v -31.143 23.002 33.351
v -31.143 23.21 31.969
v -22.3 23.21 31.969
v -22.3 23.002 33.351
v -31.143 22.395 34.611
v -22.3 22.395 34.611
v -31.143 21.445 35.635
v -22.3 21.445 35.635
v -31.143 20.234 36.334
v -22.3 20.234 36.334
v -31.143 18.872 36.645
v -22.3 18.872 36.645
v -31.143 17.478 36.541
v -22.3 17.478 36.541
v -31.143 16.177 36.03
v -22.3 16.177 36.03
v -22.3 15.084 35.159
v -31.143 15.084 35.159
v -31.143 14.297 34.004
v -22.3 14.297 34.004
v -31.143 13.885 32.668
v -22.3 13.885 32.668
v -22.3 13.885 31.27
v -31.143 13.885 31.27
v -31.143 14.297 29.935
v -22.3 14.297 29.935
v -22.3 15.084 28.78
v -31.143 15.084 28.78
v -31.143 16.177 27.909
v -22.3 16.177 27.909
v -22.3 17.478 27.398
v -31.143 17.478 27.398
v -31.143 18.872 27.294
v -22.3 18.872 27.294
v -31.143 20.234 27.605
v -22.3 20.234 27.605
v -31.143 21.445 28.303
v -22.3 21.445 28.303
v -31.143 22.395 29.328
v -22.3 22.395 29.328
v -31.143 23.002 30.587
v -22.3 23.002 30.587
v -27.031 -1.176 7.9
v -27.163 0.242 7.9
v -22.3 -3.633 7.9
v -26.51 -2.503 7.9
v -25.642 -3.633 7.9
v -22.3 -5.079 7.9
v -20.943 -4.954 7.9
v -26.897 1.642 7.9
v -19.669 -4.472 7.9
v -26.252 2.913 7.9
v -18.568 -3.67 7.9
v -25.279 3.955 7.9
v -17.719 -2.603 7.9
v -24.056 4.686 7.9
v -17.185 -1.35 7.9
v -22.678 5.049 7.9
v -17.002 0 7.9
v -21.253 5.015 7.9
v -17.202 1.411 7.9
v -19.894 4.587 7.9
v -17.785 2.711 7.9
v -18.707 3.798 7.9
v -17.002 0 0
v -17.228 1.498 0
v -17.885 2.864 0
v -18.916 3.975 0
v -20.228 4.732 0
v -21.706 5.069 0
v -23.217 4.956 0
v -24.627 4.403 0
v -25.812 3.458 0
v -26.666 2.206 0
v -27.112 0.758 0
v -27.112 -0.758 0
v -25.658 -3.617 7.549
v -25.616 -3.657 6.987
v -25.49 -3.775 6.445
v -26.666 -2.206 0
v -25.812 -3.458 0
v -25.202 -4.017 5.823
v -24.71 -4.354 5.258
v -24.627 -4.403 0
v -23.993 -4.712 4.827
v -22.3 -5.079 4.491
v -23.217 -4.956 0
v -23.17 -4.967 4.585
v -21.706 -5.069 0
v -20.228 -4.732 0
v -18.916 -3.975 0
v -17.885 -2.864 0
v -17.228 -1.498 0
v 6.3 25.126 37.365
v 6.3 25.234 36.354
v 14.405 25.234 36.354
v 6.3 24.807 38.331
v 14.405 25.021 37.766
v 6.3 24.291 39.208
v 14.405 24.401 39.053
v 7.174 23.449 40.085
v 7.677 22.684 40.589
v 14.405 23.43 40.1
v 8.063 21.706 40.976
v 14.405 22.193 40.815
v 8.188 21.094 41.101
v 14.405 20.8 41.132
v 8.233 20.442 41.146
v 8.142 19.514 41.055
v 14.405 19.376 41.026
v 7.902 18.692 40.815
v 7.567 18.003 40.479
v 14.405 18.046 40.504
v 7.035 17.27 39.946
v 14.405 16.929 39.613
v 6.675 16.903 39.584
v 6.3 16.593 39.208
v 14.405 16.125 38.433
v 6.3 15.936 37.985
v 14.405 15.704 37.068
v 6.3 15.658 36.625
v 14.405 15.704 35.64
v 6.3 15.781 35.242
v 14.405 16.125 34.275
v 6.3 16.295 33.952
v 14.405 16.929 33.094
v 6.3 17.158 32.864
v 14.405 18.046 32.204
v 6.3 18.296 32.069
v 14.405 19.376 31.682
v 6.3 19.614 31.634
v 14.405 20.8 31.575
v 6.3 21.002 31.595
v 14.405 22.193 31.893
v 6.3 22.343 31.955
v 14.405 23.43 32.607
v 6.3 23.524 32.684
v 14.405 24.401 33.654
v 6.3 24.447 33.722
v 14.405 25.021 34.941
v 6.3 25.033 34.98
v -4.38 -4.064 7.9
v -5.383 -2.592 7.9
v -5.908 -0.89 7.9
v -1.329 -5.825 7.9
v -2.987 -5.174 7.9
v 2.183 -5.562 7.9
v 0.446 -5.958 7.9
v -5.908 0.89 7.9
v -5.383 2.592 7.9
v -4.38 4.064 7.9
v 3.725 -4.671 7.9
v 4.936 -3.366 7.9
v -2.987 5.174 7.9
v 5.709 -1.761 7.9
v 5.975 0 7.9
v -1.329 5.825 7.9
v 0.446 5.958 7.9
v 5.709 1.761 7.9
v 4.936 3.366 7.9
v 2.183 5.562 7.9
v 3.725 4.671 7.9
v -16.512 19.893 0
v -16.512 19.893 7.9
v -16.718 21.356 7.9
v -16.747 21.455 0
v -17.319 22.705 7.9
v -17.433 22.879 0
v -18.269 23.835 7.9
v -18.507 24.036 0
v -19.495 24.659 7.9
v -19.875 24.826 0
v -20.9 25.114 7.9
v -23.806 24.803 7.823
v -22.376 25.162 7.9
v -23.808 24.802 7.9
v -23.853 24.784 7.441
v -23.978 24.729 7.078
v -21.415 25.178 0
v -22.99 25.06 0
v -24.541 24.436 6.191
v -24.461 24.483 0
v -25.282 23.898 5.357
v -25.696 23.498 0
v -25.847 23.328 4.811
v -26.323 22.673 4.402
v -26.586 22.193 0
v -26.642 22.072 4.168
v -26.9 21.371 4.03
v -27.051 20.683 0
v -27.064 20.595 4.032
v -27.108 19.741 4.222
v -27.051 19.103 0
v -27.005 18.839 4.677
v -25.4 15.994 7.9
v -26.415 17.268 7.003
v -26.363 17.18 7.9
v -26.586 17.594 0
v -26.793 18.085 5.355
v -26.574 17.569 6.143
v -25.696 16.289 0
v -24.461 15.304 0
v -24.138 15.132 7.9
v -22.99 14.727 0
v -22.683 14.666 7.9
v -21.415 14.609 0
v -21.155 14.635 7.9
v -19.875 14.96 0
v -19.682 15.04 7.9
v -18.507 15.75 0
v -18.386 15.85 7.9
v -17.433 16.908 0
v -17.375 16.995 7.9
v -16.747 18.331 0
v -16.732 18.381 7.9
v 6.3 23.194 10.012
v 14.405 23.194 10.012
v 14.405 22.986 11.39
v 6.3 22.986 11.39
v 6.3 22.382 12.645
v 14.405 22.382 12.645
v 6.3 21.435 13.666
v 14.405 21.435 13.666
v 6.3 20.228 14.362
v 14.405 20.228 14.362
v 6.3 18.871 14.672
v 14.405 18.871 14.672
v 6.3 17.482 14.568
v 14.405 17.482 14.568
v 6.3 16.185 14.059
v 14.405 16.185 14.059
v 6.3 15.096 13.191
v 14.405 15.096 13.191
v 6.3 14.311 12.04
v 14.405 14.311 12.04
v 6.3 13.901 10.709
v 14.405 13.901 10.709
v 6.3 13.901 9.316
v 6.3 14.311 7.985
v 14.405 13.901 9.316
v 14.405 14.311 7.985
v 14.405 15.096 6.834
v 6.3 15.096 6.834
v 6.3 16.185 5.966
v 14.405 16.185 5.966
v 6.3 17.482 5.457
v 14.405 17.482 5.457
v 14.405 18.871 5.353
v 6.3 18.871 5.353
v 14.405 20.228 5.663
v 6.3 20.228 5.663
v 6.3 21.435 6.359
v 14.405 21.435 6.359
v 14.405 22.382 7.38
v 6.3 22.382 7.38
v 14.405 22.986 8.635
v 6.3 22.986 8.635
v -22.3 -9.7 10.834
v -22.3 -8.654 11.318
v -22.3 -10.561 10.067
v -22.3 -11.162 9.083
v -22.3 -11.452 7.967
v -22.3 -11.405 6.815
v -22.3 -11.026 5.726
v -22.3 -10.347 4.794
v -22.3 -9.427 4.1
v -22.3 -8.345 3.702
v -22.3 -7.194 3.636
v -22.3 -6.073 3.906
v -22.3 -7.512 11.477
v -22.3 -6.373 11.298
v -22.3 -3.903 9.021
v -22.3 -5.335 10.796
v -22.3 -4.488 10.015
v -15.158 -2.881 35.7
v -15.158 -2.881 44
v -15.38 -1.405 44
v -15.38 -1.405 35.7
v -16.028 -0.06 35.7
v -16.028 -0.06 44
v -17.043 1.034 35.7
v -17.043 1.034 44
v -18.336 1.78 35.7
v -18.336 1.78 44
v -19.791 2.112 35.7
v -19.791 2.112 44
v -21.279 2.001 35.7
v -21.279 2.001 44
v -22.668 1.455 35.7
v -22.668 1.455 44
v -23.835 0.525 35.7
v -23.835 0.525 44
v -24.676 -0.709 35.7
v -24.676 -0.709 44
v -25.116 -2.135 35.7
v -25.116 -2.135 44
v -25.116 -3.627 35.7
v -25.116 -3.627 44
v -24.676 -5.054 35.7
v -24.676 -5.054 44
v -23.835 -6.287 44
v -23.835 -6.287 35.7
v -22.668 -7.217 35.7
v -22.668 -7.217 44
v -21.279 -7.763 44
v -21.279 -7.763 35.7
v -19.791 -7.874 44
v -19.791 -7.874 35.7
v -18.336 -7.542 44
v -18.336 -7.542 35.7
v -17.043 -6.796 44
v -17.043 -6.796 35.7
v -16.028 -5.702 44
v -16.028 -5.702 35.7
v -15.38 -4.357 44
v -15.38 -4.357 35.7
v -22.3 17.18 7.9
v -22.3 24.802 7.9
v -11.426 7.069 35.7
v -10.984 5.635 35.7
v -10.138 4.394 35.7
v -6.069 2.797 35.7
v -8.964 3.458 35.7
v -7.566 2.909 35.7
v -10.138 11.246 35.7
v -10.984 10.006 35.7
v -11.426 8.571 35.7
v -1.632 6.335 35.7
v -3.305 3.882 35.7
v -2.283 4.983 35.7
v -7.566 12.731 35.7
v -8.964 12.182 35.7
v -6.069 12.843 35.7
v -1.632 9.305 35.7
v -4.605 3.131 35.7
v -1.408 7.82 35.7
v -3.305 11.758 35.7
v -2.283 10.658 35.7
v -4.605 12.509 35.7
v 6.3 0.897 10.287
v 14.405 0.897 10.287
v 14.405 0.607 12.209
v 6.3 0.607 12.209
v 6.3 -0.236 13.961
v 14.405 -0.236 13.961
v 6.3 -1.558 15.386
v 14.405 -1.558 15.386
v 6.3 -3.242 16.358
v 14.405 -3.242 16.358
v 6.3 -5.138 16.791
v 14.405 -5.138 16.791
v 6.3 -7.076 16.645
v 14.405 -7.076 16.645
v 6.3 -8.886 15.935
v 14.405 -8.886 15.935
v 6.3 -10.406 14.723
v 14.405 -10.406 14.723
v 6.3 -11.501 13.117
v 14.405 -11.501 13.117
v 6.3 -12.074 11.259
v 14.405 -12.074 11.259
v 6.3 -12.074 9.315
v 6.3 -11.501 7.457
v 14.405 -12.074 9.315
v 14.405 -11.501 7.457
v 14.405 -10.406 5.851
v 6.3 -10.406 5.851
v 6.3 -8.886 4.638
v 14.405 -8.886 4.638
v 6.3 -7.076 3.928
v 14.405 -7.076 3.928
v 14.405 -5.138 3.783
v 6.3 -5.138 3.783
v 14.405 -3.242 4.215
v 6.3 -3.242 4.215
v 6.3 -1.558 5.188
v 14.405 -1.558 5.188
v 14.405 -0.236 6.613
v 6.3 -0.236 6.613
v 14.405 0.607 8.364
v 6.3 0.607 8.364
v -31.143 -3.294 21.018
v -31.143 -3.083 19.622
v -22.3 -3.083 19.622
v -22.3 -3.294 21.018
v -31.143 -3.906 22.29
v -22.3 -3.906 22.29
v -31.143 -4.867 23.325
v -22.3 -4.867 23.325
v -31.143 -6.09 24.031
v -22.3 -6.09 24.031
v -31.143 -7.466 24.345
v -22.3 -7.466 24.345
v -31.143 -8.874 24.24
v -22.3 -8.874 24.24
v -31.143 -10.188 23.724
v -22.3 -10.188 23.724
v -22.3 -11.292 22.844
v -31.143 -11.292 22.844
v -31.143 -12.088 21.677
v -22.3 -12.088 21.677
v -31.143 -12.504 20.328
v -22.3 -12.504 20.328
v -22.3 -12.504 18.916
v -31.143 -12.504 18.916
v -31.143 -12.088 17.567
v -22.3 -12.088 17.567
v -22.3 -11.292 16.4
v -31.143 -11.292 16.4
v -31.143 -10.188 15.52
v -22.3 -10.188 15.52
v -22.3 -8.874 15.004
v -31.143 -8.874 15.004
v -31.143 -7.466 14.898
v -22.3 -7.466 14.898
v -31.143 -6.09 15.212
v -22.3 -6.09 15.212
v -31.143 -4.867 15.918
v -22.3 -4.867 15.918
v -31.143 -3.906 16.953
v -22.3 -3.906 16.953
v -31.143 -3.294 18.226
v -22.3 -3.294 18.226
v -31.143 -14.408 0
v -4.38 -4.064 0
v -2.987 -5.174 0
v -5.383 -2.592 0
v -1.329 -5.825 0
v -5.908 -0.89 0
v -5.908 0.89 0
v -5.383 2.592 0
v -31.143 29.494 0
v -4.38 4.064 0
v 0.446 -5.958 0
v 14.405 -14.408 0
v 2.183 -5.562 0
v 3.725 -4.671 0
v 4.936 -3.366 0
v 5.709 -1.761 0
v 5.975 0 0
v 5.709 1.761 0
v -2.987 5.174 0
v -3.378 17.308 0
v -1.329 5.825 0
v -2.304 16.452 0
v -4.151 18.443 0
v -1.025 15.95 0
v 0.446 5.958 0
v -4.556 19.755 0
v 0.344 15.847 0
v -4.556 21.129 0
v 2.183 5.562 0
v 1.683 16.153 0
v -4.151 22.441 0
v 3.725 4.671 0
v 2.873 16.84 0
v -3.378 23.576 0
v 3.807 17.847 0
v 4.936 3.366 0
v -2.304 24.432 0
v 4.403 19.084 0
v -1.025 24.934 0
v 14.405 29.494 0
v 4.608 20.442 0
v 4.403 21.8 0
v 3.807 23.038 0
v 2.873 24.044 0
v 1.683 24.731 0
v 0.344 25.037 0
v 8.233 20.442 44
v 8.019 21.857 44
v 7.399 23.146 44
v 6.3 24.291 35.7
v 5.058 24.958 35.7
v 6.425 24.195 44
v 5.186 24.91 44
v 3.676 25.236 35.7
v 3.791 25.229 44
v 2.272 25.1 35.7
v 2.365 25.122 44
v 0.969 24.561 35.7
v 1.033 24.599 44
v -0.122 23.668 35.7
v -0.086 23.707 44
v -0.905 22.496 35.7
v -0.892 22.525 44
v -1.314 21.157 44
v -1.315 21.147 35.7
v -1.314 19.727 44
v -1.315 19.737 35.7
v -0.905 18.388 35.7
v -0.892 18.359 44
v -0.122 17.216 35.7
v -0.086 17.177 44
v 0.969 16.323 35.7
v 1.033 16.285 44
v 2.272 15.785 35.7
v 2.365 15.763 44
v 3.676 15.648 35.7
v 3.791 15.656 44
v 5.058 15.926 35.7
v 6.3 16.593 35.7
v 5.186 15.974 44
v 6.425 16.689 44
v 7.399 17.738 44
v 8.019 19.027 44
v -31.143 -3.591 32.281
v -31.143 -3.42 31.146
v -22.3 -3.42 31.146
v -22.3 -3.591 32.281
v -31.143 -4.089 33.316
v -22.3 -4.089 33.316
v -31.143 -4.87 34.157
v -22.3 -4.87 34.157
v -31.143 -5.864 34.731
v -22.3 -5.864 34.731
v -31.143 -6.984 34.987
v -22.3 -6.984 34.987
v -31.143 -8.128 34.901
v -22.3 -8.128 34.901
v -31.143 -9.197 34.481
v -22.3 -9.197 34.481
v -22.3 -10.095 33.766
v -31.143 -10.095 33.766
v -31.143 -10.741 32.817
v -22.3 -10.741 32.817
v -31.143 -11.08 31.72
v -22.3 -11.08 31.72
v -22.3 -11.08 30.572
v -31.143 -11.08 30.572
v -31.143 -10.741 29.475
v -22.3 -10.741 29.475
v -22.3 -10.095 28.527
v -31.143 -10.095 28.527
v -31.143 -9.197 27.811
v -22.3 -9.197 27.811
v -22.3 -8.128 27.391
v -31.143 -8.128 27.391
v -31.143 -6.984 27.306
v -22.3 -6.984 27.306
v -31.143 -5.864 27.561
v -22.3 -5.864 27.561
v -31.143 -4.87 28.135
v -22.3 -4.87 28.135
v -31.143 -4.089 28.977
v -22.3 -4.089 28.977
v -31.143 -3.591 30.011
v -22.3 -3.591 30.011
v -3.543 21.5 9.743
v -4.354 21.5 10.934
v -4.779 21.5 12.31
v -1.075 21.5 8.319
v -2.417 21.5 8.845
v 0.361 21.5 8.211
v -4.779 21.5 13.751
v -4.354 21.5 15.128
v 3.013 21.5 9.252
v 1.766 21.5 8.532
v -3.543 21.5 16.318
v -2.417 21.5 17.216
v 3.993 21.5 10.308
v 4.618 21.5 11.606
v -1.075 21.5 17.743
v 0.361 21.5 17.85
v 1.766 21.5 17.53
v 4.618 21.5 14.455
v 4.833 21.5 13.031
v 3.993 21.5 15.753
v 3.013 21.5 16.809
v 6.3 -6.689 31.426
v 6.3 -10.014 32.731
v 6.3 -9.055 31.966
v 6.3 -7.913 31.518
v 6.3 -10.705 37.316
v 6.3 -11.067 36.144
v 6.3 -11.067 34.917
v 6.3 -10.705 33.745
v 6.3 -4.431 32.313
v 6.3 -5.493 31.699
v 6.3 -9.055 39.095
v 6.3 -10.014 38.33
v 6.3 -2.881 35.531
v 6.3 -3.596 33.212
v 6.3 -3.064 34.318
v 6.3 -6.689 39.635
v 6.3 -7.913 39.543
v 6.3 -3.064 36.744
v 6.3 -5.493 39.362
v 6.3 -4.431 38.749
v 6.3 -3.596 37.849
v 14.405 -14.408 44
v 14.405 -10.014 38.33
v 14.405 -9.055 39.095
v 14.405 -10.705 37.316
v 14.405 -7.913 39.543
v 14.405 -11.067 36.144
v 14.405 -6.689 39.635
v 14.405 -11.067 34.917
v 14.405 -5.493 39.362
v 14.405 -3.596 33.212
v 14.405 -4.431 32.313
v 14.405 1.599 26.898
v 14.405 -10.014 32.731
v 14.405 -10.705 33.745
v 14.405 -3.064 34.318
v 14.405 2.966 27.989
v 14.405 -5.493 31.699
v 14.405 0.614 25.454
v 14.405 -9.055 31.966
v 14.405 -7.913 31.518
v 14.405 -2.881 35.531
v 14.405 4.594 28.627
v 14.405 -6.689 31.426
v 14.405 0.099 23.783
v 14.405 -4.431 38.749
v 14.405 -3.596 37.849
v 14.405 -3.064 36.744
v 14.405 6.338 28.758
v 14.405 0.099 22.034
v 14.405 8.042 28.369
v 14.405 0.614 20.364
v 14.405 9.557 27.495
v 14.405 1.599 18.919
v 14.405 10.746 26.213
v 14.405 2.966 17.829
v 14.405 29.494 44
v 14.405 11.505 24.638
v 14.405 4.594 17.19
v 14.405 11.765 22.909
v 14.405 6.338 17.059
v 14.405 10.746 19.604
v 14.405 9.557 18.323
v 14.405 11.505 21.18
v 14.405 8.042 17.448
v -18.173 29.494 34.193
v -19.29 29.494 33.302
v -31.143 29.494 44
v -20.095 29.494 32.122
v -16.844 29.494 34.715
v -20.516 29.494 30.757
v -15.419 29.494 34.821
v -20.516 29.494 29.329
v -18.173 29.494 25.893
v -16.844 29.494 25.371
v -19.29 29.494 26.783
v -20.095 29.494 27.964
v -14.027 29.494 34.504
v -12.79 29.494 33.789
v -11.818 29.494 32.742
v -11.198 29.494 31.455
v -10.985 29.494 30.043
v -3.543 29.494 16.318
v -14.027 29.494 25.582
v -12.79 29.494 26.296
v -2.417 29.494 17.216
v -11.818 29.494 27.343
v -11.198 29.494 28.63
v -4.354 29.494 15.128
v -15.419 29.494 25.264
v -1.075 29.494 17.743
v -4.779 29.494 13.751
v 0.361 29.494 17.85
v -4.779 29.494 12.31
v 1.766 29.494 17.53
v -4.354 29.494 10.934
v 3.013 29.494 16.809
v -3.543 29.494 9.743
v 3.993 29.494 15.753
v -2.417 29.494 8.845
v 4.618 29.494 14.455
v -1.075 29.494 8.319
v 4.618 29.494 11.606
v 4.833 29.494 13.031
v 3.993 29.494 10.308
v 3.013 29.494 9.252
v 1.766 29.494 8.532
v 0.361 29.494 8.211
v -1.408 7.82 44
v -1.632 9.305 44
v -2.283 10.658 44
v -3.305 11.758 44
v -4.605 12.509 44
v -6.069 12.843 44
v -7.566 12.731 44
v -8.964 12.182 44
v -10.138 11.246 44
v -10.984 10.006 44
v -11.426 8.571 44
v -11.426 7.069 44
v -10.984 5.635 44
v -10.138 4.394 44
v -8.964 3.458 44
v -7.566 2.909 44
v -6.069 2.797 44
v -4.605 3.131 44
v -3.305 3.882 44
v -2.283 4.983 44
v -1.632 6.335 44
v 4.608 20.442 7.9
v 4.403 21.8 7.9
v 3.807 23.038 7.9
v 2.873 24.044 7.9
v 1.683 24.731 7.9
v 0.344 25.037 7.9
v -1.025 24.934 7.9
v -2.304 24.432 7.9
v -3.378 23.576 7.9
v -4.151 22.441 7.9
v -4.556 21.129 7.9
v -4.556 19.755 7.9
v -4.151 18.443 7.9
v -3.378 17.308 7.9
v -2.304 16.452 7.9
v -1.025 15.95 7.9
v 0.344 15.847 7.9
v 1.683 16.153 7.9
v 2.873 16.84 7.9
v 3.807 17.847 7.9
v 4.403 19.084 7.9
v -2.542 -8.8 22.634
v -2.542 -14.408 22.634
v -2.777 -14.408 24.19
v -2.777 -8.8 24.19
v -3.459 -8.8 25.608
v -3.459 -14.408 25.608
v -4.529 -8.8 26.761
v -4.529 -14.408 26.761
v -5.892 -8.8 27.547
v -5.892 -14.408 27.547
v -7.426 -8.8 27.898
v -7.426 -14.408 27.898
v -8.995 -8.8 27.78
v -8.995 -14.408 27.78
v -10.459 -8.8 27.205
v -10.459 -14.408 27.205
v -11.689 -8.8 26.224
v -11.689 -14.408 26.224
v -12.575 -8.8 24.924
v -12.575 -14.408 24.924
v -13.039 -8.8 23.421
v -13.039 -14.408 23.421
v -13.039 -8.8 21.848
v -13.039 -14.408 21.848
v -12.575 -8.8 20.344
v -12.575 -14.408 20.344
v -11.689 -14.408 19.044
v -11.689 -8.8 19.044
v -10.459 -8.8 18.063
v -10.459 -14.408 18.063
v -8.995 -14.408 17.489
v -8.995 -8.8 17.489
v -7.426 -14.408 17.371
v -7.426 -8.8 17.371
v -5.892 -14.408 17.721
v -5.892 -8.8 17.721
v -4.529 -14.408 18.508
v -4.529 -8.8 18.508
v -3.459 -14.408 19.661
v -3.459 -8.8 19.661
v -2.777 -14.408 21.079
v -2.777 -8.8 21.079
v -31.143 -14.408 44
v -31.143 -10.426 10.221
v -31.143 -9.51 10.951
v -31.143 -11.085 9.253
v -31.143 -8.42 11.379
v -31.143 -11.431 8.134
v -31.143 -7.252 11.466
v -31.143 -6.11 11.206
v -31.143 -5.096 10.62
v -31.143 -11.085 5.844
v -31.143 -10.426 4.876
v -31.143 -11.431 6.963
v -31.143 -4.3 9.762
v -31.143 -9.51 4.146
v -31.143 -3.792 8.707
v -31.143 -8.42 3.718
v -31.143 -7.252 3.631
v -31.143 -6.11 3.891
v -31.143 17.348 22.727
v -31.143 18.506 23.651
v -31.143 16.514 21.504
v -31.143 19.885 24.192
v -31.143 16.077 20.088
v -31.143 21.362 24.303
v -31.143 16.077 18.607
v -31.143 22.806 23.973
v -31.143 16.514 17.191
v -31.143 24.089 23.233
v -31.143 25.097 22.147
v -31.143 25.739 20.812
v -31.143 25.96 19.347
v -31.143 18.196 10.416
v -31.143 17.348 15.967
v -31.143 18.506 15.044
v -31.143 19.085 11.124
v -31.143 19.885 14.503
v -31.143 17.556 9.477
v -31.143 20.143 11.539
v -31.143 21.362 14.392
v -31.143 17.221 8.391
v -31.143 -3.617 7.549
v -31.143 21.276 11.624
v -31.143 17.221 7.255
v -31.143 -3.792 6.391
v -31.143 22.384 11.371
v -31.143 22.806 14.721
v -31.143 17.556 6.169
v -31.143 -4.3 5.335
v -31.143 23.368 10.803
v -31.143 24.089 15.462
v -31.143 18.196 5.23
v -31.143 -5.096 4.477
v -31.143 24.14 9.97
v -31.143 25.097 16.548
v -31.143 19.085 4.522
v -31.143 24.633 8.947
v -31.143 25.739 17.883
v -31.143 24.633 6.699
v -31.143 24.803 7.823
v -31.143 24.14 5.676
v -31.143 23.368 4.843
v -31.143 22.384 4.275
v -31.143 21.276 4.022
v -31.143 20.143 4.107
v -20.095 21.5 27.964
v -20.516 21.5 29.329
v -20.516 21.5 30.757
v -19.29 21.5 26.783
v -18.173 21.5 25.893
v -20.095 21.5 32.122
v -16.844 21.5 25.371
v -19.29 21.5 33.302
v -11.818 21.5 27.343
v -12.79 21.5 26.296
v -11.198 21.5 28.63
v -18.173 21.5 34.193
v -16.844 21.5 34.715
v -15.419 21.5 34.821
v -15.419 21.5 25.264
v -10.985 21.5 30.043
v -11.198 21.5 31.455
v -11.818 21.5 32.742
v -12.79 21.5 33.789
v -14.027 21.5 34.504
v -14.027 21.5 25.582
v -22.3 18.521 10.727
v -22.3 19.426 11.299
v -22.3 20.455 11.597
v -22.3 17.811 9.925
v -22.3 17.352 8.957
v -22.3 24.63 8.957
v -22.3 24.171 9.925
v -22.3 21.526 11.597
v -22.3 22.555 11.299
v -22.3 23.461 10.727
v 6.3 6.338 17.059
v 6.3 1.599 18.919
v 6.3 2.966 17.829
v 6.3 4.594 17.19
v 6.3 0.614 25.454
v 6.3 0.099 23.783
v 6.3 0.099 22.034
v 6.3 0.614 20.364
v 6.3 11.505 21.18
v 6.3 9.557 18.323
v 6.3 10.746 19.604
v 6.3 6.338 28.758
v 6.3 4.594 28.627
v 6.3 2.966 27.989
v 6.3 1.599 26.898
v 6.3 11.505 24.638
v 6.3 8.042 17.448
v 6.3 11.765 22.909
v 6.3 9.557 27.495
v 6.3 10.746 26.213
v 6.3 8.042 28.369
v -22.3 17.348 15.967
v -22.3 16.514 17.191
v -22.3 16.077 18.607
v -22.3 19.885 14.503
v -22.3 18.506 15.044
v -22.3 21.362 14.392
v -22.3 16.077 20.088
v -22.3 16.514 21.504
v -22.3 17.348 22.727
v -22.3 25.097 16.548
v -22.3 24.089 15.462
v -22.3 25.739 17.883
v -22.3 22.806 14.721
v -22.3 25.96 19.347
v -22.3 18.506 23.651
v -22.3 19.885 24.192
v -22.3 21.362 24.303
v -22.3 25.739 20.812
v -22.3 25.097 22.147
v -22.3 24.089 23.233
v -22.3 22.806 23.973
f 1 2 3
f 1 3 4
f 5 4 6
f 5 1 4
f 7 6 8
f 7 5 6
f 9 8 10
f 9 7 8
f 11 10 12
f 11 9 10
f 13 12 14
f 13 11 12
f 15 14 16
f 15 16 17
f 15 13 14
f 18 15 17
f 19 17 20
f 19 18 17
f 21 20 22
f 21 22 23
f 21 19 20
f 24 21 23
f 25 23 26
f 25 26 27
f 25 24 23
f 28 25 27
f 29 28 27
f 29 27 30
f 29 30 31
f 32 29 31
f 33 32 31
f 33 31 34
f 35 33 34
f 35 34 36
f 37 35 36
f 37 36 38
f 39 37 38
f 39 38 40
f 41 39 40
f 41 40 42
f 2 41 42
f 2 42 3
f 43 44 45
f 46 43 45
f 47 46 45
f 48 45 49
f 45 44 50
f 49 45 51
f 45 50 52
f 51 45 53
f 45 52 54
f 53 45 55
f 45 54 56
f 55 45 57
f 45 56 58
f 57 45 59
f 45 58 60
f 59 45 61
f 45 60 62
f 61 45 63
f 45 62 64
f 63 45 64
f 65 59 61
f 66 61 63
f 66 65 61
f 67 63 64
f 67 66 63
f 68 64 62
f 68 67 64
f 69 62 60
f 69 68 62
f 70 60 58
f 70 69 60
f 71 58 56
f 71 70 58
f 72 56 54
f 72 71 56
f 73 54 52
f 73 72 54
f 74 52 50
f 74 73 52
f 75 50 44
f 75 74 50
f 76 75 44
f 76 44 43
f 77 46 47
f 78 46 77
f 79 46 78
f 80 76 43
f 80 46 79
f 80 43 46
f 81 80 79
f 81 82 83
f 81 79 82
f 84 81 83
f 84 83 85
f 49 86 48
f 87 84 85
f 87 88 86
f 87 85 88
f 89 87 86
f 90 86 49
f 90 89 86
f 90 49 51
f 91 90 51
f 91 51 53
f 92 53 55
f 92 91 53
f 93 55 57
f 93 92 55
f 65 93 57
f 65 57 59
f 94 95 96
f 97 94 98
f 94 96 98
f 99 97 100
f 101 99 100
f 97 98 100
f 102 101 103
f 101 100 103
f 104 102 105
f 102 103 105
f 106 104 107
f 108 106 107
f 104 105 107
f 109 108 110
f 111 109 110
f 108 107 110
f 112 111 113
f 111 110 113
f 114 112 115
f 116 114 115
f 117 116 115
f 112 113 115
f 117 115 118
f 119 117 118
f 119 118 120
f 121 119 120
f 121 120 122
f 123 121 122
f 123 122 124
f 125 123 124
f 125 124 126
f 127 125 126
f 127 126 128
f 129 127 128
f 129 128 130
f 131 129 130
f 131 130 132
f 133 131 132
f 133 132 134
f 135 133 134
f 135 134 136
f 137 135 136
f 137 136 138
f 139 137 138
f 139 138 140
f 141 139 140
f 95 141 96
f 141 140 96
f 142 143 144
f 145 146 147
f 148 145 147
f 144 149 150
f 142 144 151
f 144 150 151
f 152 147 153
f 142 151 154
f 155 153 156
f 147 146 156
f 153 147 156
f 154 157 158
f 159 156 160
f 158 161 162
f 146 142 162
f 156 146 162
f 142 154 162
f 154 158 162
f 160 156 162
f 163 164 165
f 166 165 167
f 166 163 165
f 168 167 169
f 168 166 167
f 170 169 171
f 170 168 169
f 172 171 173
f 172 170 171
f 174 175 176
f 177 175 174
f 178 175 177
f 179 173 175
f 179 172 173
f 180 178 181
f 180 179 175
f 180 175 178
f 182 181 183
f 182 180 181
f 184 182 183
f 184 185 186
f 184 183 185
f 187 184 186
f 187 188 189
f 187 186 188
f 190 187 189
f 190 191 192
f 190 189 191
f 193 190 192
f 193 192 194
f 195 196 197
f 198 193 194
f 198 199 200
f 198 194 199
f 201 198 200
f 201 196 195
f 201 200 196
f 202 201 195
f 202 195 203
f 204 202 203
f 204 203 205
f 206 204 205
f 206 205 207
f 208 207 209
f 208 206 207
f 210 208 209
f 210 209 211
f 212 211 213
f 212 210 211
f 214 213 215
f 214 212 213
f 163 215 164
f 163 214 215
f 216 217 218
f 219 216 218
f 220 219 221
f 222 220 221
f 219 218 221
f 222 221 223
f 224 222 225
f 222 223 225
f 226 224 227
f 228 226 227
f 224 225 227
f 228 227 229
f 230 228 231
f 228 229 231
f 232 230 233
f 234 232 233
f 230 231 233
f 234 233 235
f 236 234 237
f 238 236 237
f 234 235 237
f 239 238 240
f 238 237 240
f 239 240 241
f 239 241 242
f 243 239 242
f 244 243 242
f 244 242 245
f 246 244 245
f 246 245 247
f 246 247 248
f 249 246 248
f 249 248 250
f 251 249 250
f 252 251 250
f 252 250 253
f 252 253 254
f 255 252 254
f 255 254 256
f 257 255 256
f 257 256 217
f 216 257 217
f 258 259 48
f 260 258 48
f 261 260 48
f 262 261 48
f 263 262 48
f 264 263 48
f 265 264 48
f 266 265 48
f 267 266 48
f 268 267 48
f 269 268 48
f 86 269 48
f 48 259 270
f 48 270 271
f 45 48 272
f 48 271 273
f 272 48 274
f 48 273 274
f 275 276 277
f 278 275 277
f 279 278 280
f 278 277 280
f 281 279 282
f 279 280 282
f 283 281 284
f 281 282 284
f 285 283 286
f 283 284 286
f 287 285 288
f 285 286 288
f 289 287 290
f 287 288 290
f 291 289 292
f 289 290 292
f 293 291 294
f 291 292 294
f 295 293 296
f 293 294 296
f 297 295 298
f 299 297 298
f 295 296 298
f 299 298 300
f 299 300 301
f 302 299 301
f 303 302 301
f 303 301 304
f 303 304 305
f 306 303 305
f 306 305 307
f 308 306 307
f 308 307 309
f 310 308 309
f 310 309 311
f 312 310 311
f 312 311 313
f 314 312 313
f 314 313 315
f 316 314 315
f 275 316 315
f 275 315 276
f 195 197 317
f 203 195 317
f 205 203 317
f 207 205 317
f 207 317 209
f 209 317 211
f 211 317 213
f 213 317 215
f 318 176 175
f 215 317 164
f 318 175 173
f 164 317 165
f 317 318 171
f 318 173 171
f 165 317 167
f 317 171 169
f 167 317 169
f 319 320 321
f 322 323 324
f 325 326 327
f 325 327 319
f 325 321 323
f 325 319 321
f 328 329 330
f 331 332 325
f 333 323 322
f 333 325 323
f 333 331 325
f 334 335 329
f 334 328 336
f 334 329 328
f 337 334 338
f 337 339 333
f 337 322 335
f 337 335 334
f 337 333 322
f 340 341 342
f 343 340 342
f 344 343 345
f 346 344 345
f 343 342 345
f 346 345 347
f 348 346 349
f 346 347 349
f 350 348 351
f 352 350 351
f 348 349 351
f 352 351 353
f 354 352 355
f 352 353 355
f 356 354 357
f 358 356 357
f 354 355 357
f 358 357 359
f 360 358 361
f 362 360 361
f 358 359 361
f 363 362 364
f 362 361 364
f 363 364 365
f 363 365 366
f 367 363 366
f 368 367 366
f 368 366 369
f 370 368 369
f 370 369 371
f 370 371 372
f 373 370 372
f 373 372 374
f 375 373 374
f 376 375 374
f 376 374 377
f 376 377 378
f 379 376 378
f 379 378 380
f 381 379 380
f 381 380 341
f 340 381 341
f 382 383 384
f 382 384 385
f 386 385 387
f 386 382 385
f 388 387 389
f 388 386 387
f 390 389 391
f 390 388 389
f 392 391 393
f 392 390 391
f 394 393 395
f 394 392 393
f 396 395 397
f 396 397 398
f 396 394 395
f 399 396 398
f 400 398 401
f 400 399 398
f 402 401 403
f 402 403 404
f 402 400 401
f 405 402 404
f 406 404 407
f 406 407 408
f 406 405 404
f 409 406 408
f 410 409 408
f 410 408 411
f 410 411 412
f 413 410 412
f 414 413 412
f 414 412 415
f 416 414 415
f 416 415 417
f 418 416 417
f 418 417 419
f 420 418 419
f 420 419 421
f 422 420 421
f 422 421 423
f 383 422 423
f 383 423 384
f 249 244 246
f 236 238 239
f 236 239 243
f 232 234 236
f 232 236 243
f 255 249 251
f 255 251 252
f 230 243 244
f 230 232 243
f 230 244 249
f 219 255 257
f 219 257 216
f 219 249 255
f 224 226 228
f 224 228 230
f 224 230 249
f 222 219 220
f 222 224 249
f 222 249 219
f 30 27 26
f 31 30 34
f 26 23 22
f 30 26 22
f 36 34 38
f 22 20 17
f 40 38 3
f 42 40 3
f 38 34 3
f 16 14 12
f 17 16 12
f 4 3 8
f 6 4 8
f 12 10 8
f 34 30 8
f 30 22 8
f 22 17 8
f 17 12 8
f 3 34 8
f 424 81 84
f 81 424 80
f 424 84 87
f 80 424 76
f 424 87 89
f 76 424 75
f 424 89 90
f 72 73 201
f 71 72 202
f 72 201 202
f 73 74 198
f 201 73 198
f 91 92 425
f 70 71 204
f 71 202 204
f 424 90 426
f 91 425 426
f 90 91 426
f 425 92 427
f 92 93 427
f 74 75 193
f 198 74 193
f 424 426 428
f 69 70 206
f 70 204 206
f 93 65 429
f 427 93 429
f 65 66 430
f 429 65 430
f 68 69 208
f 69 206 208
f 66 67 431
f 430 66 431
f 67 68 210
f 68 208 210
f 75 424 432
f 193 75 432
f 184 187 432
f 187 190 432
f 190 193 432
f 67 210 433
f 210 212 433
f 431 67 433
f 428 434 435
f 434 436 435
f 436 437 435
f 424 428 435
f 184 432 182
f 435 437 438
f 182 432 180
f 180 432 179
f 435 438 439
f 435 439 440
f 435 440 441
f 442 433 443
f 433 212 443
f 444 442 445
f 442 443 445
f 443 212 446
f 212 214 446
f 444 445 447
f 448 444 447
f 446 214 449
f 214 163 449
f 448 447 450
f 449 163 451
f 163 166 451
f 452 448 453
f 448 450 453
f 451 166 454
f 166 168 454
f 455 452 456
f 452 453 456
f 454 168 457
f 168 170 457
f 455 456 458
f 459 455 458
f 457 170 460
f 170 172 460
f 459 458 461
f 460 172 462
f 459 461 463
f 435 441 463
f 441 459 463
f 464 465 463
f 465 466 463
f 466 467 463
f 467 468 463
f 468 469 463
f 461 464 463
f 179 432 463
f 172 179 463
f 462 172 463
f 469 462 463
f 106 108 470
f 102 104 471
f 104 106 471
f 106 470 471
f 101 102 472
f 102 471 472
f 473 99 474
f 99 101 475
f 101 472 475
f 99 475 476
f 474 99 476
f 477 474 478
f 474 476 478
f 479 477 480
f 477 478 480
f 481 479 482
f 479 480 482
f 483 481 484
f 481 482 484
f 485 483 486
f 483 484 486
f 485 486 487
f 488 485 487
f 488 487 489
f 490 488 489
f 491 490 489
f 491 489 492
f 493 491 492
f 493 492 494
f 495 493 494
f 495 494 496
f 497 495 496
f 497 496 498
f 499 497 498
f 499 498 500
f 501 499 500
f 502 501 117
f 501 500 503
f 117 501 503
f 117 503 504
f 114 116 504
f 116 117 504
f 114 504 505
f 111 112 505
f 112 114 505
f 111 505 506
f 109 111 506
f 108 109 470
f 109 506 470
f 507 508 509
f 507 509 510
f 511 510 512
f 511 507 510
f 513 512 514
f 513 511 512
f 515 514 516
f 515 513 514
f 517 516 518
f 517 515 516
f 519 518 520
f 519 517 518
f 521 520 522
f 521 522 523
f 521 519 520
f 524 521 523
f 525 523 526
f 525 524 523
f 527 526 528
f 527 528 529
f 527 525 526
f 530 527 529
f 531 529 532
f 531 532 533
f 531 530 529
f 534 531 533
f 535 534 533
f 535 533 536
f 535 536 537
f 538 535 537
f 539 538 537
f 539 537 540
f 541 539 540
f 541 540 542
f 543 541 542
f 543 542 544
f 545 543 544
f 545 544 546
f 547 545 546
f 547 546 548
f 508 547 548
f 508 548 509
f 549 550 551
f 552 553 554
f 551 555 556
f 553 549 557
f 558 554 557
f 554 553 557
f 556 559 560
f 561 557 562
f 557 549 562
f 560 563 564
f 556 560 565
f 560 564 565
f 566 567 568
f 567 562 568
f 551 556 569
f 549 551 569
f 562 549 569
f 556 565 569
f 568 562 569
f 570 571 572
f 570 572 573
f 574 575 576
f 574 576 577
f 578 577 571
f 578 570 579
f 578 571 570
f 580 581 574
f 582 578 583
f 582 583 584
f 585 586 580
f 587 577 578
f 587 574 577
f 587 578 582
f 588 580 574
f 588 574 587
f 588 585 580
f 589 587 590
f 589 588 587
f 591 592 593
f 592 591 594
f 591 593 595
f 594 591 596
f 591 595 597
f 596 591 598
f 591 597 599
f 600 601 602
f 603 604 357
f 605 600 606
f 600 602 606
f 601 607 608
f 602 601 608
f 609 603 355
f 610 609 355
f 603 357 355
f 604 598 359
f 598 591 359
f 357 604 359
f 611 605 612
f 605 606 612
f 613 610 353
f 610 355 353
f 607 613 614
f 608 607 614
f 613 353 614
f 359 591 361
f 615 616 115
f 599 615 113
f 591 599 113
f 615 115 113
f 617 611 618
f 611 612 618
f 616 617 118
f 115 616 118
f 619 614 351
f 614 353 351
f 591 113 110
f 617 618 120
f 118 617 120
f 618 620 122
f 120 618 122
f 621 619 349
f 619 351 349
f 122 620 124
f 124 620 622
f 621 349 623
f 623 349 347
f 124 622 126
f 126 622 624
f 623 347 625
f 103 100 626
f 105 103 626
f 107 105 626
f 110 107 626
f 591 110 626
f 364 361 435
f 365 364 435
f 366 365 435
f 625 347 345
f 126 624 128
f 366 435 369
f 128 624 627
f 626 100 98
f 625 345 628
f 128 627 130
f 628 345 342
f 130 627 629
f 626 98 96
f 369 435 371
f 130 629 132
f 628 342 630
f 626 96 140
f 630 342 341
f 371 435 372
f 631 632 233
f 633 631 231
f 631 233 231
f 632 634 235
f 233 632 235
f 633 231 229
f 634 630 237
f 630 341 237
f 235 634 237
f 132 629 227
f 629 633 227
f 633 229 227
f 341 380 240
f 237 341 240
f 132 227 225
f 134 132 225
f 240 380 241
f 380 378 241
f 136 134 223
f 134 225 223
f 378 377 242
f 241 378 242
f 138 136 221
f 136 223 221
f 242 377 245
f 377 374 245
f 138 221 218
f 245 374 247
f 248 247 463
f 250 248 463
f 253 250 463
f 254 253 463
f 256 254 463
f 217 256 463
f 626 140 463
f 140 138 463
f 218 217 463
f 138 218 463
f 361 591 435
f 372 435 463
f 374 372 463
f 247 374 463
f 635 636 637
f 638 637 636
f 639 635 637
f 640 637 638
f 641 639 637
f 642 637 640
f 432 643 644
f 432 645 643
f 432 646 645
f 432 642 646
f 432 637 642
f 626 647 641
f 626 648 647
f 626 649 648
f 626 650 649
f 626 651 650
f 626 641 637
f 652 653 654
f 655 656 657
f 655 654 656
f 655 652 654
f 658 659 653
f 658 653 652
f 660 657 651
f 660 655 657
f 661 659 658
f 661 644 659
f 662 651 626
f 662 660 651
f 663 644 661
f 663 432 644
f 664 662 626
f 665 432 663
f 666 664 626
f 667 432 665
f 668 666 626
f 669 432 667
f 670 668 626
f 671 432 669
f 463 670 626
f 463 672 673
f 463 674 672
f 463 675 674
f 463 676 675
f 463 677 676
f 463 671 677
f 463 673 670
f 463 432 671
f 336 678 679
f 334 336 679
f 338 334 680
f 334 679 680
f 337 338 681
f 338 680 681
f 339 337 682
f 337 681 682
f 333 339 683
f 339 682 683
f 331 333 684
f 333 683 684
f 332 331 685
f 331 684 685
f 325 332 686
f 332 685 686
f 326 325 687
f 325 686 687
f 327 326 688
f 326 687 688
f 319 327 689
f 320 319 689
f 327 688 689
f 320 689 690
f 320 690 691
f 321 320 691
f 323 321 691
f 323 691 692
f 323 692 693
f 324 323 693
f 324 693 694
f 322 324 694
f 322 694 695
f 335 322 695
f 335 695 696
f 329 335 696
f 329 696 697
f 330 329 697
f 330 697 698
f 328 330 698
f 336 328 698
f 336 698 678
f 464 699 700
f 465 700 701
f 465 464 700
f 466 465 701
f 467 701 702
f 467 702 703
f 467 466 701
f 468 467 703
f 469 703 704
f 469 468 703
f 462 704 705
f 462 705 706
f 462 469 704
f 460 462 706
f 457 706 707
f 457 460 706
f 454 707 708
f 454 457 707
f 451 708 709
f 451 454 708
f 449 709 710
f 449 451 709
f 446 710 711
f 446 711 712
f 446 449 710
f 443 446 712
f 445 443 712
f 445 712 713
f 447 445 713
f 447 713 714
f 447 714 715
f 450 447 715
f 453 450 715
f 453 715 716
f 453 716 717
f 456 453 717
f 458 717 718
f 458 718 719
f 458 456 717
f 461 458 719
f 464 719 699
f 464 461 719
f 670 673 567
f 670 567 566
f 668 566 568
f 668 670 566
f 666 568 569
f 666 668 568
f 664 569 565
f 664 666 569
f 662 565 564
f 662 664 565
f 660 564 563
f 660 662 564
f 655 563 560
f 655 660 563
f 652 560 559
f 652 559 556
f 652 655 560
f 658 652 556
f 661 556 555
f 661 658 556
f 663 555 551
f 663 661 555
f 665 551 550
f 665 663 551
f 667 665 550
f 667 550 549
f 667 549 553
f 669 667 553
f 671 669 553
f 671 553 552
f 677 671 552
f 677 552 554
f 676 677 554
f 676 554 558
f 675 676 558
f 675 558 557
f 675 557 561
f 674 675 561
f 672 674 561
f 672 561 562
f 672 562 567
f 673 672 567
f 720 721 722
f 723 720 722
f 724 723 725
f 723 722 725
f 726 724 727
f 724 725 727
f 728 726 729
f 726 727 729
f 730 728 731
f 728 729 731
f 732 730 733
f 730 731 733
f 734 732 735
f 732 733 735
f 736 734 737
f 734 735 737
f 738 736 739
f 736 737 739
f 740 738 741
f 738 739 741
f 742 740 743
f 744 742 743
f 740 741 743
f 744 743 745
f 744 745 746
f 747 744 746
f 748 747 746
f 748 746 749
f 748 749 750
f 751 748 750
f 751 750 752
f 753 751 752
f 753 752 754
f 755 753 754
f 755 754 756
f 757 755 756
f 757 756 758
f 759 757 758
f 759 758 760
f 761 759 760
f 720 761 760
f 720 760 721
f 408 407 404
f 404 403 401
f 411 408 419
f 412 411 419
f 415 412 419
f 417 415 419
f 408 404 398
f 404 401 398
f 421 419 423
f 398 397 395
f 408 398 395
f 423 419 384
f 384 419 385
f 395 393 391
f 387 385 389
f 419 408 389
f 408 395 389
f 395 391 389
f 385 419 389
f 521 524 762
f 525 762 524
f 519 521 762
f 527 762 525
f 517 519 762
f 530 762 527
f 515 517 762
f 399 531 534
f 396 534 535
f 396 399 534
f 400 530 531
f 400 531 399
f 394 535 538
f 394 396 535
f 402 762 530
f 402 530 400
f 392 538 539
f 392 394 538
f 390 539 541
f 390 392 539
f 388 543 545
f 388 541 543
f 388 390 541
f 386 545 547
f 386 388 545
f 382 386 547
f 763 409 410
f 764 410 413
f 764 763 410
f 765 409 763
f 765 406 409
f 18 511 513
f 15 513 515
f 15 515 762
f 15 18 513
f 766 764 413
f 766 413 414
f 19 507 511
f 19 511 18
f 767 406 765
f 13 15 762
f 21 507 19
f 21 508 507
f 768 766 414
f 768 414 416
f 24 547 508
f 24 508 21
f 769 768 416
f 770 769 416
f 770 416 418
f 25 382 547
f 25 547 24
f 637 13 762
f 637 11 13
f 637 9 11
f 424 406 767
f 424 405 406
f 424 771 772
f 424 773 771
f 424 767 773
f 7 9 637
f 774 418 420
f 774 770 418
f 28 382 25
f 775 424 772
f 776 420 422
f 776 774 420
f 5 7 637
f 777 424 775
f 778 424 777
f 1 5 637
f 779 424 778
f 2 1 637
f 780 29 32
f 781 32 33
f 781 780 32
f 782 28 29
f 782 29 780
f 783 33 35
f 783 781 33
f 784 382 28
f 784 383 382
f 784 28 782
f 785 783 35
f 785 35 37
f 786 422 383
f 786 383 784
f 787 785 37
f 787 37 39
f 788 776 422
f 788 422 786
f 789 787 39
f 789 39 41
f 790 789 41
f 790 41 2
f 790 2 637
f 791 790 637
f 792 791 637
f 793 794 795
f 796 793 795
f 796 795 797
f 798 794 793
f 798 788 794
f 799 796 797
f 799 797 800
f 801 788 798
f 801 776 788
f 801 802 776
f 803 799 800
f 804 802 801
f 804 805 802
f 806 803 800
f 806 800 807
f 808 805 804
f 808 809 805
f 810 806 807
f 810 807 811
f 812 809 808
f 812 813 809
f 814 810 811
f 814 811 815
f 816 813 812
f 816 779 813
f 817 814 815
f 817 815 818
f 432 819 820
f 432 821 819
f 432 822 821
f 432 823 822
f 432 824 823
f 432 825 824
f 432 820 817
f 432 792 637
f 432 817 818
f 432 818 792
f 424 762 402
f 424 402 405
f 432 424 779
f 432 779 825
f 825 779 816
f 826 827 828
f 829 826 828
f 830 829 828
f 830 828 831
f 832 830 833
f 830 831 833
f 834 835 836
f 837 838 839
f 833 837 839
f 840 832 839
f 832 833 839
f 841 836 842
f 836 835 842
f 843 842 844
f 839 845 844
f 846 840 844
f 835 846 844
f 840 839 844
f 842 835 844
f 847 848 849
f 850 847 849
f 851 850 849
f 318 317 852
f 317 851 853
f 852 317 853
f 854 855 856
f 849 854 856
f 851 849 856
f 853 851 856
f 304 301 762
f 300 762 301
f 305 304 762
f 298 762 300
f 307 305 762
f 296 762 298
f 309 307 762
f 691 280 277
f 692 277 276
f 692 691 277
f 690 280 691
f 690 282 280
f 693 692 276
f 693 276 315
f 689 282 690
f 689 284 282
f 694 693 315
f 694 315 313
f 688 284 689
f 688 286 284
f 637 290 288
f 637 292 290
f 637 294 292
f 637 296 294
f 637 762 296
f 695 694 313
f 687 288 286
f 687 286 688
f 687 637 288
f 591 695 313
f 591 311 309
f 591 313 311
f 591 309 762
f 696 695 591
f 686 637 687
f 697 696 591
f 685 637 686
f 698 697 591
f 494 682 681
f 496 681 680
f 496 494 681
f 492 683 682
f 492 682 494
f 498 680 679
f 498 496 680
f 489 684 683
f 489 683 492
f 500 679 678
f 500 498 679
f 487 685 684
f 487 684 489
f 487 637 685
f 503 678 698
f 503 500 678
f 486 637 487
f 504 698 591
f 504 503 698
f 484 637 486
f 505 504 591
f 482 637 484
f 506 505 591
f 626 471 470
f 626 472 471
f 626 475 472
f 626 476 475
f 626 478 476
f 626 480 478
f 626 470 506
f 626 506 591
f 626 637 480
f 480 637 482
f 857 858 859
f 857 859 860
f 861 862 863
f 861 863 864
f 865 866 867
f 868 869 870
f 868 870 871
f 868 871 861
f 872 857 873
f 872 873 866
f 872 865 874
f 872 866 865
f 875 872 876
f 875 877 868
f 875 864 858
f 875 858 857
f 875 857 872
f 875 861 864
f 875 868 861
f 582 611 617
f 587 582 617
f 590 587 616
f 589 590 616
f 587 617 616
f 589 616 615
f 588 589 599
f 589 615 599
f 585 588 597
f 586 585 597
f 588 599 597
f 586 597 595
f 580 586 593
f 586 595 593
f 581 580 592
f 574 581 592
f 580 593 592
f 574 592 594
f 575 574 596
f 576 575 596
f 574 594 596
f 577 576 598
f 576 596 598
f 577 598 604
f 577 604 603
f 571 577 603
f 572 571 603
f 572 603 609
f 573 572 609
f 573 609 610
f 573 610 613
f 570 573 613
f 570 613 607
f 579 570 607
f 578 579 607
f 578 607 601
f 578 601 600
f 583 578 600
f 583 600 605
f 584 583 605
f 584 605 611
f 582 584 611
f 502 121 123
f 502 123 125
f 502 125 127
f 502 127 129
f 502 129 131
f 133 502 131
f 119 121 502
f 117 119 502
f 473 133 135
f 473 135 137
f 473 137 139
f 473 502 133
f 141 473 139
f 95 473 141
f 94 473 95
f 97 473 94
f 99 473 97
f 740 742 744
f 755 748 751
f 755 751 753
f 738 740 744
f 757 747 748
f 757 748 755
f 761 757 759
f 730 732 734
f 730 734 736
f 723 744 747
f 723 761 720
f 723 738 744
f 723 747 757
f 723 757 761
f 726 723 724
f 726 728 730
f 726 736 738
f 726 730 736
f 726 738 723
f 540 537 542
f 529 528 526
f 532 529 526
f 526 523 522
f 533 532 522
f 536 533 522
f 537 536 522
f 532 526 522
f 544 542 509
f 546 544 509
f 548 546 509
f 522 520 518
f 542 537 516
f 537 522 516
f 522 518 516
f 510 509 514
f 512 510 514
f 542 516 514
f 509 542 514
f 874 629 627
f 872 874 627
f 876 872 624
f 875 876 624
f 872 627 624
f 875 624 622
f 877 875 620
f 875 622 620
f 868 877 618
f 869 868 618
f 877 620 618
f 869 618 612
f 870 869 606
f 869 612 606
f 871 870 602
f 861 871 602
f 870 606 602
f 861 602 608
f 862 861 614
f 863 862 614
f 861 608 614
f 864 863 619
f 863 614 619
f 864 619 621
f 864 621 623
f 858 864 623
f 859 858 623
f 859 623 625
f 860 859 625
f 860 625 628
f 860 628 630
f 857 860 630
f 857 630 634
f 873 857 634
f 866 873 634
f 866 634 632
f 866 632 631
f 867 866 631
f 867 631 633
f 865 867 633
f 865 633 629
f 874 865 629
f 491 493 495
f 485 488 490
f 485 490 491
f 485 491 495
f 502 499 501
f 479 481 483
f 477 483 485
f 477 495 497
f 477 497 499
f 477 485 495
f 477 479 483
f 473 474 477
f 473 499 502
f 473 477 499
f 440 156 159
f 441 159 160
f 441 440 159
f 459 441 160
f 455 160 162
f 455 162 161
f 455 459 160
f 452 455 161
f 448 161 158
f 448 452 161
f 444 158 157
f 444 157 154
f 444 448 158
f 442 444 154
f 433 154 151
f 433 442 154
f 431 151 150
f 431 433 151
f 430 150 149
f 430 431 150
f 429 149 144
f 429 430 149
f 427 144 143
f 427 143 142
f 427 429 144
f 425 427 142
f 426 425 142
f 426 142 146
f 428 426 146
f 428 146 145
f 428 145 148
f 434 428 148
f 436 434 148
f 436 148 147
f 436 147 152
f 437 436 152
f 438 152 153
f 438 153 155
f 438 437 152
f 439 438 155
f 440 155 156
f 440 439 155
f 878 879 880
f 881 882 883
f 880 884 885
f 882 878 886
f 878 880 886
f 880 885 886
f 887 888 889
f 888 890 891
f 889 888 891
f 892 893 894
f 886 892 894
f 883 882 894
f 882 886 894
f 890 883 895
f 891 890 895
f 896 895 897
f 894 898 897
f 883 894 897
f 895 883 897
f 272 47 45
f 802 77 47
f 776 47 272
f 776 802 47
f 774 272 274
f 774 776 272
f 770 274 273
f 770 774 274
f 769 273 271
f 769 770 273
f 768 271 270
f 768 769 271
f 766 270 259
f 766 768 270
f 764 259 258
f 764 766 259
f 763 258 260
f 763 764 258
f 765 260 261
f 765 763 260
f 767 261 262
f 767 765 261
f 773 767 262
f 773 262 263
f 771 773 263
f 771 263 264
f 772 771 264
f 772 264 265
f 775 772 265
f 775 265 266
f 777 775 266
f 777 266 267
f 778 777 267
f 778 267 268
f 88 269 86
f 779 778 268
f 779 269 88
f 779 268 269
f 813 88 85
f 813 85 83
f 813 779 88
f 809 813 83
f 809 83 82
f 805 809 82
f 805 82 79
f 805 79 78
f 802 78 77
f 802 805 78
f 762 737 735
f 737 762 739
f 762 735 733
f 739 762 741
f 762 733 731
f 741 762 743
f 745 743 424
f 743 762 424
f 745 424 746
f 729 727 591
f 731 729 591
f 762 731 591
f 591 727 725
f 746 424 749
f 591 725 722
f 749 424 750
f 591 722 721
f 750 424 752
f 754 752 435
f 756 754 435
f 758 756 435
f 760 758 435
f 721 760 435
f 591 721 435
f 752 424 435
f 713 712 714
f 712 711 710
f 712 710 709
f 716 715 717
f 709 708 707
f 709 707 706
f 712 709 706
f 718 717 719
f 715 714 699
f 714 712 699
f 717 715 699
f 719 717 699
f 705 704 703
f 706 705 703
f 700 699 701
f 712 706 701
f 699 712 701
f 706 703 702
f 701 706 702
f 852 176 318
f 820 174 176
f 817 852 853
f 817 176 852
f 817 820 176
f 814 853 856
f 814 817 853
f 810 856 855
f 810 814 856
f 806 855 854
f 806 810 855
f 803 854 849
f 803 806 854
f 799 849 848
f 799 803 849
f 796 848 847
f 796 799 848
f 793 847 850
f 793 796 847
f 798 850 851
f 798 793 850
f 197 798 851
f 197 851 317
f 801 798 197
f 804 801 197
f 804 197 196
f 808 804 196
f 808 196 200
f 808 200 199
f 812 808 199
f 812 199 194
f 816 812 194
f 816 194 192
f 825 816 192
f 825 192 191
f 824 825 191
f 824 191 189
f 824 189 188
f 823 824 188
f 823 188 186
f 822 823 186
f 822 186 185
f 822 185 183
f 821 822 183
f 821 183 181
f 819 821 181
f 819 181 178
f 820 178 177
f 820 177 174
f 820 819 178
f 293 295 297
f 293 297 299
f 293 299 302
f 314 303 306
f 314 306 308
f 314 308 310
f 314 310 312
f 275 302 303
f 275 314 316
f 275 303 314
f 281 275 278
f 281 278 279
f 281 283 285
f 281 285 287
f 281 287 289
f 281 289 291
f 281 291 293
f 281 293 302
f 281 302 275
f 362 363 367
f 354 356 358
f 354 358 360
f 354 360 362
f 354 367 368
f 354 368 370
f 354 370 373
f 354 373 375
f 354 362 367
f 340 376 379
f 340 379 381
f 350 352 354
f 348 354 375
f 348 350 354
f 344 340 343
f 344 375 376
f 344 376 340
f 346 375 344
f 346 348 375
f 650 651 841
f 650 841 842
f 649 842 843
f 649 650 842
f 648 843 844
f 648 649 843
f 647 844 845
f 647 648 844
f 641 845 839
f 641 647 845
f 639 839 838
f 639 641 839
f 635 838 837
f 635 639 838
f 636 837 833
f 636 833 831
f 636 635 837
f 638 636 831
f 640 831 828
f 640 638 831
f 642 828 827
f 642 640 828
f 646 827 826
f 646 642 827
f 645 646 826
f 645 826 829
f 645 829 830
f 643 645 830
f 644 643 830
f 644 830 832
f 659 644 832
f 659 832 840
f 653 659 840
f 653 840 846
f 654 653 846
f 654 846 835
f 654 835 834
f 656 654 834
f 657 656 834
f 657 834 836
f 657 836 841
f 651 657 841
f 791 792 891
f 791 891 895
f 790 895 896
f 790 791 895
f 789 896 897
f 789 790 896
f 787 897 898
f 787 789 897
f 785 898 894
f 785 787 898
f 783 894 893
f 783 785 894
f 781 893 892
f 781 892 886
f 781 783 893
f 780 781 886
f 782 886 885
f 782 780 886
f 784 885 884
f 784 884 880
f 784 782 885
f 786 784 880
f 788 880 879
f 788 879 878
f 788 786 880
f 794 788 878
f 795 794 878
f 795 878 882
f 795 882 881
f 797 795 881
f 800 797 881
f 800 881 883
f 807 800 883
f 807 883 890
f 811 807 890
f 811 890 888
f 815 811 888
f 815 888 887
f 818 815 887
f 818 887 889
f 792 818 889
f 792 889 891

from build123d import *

# Parameters (mm, degrees)
F0_W      = 45.548788
F0_H      = 43.902439
F1_DEPTH  = 44
F3_R      = 5.278003
F4_DEPTH  = 6.1
F6_R      = 4.792021
F6_R_2    = 4.833087
F7_DEPTH  = 8.7
F9_R      = 5.007153
F9_R_2    = 5.037139
F9_R_3    = 4.799872
F10_DEPTH = 9.9
F11_R     = 5.299354
F11_R_2   = 5.083632
F11_R_3   = 4.607541
F11_R_4   = 5.974621
F12_DEPTH = 7.9
F14_R     = 4.115857
F14_R_2   = 4.79202
F14_R_3   = 5.865796
F14_R_4   = 6.522182
F14_R_5   = 4.672699
F15_DEPTH = 8.3
F17_R     = 3.928671
F17_R_2   = 4.73671
F17_R_3   = 3.851249
F17_R_4   = 3.81195
F17_R_5   = 4.969419
F17_R_6   = 4.688783
F18_DEPTH = 9


with BuildPart() as f1:
    # F0 (on Top) → F1 (new body)
    with BuildSketch(Plane.XY):
        with Locations((-8.368903, 7.542874)):
            Rectangle(F0_W, F0_H)
    extrude(amount=F1_DEPTH)

    # F3 (on offset) → F4 (cut)
    with BuildSketch(Plane.XZ.offset(14.9)):
        with Locations((-7.820123, 22.634339)):
            Circle(F3_R)
    extrude(amount=-F4_DEPTH, mode=Mode.SUBTRACT)

    # F6 (on offset) → F7 (cut)
    with BuildSketch(Plane.XZ.offset(-30.2)):
        with Locations((-15.777439, 30.042876)):
            Circle(F6_R)
        with Locations((0, 13.03068)):
            Circle(F6_R_2)
    extrude(amount=F7_DEPTH, mode=Mode.SUBTRACT)

    # F9 (on offset) → F10 (cut)
    with BuildSketch(Plane.XY.offset(45.6)):
        with Locations((-20.164827, -2.881098)):
            Circle(F9_R)
        with Locations((-6.445313, 7.82012)):
            Circle(F9_R_2)
        with Locations((3.432736, 20.442074)):
            Circle(F9_R_3)
    extrude(amount=-F10_DEPTH, mode=Mode.SUBTRACT)

    # F11 (on Top) → F12 (cut)
    with BuildSketch(Plane.XY):
        with Locations((-21.811167, 19.893292)):
            Circle(F11_R)
        with Locations((-22.085557, 0)):
            Circle(F11_R_2)
        with Locations((0, 20.442074)):
            Circle(F11_R_3)
        Circle(F11_R_4)
    extrude(amount=F12_DEPTH, mode=Mode.SUBTRACT)

    # F14 (on offset) → F15 (cut)
    with BuildSketch(Plane.YZ.offset(14.6)):
        with Locations((-6.996952, 35.530679)):
            Circle(F14_R)
        with Locations((20.442074, 36.353853)):
            Circle(F14_R_2)
        with Locations((5.89939, 22.90873)):
            Circle(F14_R_3)
        with Locations((-5.625001, 10.286777)):
            Circle(F14_R_4)
        with Locations((18.521342, 10.012387)):
            Circle(F14_R_5)
    extrude(amount=-F15_DEPTH, mode=Mode.SUBTRACT)

    # F17 (on offset) → F18 (cut)
    with BuildSketch(Plane.YZ.offset(-31.3)):
        with Locations((-7.545732, 7.54859)):
            Circle(F17_R)
        with Locations((-7.820123, 19.621762)):
            Circle(F17_R_2)
        with Locations((-7.271341, 31.146152)):
            Circle(F17_R_3)
        with Locations((20.990856, 7.82298)):
            Circle(F17_R_4)
        with Locations((20.990856, 19.34737)):
            Circle(F17_R_5)
        with Locations((18.521342, 31.969324)):
            Circle(F17_R_6)
    extrude(amount=F18_DEPTH, mode=Mode.SUBTRACT)


solid = f1.part
